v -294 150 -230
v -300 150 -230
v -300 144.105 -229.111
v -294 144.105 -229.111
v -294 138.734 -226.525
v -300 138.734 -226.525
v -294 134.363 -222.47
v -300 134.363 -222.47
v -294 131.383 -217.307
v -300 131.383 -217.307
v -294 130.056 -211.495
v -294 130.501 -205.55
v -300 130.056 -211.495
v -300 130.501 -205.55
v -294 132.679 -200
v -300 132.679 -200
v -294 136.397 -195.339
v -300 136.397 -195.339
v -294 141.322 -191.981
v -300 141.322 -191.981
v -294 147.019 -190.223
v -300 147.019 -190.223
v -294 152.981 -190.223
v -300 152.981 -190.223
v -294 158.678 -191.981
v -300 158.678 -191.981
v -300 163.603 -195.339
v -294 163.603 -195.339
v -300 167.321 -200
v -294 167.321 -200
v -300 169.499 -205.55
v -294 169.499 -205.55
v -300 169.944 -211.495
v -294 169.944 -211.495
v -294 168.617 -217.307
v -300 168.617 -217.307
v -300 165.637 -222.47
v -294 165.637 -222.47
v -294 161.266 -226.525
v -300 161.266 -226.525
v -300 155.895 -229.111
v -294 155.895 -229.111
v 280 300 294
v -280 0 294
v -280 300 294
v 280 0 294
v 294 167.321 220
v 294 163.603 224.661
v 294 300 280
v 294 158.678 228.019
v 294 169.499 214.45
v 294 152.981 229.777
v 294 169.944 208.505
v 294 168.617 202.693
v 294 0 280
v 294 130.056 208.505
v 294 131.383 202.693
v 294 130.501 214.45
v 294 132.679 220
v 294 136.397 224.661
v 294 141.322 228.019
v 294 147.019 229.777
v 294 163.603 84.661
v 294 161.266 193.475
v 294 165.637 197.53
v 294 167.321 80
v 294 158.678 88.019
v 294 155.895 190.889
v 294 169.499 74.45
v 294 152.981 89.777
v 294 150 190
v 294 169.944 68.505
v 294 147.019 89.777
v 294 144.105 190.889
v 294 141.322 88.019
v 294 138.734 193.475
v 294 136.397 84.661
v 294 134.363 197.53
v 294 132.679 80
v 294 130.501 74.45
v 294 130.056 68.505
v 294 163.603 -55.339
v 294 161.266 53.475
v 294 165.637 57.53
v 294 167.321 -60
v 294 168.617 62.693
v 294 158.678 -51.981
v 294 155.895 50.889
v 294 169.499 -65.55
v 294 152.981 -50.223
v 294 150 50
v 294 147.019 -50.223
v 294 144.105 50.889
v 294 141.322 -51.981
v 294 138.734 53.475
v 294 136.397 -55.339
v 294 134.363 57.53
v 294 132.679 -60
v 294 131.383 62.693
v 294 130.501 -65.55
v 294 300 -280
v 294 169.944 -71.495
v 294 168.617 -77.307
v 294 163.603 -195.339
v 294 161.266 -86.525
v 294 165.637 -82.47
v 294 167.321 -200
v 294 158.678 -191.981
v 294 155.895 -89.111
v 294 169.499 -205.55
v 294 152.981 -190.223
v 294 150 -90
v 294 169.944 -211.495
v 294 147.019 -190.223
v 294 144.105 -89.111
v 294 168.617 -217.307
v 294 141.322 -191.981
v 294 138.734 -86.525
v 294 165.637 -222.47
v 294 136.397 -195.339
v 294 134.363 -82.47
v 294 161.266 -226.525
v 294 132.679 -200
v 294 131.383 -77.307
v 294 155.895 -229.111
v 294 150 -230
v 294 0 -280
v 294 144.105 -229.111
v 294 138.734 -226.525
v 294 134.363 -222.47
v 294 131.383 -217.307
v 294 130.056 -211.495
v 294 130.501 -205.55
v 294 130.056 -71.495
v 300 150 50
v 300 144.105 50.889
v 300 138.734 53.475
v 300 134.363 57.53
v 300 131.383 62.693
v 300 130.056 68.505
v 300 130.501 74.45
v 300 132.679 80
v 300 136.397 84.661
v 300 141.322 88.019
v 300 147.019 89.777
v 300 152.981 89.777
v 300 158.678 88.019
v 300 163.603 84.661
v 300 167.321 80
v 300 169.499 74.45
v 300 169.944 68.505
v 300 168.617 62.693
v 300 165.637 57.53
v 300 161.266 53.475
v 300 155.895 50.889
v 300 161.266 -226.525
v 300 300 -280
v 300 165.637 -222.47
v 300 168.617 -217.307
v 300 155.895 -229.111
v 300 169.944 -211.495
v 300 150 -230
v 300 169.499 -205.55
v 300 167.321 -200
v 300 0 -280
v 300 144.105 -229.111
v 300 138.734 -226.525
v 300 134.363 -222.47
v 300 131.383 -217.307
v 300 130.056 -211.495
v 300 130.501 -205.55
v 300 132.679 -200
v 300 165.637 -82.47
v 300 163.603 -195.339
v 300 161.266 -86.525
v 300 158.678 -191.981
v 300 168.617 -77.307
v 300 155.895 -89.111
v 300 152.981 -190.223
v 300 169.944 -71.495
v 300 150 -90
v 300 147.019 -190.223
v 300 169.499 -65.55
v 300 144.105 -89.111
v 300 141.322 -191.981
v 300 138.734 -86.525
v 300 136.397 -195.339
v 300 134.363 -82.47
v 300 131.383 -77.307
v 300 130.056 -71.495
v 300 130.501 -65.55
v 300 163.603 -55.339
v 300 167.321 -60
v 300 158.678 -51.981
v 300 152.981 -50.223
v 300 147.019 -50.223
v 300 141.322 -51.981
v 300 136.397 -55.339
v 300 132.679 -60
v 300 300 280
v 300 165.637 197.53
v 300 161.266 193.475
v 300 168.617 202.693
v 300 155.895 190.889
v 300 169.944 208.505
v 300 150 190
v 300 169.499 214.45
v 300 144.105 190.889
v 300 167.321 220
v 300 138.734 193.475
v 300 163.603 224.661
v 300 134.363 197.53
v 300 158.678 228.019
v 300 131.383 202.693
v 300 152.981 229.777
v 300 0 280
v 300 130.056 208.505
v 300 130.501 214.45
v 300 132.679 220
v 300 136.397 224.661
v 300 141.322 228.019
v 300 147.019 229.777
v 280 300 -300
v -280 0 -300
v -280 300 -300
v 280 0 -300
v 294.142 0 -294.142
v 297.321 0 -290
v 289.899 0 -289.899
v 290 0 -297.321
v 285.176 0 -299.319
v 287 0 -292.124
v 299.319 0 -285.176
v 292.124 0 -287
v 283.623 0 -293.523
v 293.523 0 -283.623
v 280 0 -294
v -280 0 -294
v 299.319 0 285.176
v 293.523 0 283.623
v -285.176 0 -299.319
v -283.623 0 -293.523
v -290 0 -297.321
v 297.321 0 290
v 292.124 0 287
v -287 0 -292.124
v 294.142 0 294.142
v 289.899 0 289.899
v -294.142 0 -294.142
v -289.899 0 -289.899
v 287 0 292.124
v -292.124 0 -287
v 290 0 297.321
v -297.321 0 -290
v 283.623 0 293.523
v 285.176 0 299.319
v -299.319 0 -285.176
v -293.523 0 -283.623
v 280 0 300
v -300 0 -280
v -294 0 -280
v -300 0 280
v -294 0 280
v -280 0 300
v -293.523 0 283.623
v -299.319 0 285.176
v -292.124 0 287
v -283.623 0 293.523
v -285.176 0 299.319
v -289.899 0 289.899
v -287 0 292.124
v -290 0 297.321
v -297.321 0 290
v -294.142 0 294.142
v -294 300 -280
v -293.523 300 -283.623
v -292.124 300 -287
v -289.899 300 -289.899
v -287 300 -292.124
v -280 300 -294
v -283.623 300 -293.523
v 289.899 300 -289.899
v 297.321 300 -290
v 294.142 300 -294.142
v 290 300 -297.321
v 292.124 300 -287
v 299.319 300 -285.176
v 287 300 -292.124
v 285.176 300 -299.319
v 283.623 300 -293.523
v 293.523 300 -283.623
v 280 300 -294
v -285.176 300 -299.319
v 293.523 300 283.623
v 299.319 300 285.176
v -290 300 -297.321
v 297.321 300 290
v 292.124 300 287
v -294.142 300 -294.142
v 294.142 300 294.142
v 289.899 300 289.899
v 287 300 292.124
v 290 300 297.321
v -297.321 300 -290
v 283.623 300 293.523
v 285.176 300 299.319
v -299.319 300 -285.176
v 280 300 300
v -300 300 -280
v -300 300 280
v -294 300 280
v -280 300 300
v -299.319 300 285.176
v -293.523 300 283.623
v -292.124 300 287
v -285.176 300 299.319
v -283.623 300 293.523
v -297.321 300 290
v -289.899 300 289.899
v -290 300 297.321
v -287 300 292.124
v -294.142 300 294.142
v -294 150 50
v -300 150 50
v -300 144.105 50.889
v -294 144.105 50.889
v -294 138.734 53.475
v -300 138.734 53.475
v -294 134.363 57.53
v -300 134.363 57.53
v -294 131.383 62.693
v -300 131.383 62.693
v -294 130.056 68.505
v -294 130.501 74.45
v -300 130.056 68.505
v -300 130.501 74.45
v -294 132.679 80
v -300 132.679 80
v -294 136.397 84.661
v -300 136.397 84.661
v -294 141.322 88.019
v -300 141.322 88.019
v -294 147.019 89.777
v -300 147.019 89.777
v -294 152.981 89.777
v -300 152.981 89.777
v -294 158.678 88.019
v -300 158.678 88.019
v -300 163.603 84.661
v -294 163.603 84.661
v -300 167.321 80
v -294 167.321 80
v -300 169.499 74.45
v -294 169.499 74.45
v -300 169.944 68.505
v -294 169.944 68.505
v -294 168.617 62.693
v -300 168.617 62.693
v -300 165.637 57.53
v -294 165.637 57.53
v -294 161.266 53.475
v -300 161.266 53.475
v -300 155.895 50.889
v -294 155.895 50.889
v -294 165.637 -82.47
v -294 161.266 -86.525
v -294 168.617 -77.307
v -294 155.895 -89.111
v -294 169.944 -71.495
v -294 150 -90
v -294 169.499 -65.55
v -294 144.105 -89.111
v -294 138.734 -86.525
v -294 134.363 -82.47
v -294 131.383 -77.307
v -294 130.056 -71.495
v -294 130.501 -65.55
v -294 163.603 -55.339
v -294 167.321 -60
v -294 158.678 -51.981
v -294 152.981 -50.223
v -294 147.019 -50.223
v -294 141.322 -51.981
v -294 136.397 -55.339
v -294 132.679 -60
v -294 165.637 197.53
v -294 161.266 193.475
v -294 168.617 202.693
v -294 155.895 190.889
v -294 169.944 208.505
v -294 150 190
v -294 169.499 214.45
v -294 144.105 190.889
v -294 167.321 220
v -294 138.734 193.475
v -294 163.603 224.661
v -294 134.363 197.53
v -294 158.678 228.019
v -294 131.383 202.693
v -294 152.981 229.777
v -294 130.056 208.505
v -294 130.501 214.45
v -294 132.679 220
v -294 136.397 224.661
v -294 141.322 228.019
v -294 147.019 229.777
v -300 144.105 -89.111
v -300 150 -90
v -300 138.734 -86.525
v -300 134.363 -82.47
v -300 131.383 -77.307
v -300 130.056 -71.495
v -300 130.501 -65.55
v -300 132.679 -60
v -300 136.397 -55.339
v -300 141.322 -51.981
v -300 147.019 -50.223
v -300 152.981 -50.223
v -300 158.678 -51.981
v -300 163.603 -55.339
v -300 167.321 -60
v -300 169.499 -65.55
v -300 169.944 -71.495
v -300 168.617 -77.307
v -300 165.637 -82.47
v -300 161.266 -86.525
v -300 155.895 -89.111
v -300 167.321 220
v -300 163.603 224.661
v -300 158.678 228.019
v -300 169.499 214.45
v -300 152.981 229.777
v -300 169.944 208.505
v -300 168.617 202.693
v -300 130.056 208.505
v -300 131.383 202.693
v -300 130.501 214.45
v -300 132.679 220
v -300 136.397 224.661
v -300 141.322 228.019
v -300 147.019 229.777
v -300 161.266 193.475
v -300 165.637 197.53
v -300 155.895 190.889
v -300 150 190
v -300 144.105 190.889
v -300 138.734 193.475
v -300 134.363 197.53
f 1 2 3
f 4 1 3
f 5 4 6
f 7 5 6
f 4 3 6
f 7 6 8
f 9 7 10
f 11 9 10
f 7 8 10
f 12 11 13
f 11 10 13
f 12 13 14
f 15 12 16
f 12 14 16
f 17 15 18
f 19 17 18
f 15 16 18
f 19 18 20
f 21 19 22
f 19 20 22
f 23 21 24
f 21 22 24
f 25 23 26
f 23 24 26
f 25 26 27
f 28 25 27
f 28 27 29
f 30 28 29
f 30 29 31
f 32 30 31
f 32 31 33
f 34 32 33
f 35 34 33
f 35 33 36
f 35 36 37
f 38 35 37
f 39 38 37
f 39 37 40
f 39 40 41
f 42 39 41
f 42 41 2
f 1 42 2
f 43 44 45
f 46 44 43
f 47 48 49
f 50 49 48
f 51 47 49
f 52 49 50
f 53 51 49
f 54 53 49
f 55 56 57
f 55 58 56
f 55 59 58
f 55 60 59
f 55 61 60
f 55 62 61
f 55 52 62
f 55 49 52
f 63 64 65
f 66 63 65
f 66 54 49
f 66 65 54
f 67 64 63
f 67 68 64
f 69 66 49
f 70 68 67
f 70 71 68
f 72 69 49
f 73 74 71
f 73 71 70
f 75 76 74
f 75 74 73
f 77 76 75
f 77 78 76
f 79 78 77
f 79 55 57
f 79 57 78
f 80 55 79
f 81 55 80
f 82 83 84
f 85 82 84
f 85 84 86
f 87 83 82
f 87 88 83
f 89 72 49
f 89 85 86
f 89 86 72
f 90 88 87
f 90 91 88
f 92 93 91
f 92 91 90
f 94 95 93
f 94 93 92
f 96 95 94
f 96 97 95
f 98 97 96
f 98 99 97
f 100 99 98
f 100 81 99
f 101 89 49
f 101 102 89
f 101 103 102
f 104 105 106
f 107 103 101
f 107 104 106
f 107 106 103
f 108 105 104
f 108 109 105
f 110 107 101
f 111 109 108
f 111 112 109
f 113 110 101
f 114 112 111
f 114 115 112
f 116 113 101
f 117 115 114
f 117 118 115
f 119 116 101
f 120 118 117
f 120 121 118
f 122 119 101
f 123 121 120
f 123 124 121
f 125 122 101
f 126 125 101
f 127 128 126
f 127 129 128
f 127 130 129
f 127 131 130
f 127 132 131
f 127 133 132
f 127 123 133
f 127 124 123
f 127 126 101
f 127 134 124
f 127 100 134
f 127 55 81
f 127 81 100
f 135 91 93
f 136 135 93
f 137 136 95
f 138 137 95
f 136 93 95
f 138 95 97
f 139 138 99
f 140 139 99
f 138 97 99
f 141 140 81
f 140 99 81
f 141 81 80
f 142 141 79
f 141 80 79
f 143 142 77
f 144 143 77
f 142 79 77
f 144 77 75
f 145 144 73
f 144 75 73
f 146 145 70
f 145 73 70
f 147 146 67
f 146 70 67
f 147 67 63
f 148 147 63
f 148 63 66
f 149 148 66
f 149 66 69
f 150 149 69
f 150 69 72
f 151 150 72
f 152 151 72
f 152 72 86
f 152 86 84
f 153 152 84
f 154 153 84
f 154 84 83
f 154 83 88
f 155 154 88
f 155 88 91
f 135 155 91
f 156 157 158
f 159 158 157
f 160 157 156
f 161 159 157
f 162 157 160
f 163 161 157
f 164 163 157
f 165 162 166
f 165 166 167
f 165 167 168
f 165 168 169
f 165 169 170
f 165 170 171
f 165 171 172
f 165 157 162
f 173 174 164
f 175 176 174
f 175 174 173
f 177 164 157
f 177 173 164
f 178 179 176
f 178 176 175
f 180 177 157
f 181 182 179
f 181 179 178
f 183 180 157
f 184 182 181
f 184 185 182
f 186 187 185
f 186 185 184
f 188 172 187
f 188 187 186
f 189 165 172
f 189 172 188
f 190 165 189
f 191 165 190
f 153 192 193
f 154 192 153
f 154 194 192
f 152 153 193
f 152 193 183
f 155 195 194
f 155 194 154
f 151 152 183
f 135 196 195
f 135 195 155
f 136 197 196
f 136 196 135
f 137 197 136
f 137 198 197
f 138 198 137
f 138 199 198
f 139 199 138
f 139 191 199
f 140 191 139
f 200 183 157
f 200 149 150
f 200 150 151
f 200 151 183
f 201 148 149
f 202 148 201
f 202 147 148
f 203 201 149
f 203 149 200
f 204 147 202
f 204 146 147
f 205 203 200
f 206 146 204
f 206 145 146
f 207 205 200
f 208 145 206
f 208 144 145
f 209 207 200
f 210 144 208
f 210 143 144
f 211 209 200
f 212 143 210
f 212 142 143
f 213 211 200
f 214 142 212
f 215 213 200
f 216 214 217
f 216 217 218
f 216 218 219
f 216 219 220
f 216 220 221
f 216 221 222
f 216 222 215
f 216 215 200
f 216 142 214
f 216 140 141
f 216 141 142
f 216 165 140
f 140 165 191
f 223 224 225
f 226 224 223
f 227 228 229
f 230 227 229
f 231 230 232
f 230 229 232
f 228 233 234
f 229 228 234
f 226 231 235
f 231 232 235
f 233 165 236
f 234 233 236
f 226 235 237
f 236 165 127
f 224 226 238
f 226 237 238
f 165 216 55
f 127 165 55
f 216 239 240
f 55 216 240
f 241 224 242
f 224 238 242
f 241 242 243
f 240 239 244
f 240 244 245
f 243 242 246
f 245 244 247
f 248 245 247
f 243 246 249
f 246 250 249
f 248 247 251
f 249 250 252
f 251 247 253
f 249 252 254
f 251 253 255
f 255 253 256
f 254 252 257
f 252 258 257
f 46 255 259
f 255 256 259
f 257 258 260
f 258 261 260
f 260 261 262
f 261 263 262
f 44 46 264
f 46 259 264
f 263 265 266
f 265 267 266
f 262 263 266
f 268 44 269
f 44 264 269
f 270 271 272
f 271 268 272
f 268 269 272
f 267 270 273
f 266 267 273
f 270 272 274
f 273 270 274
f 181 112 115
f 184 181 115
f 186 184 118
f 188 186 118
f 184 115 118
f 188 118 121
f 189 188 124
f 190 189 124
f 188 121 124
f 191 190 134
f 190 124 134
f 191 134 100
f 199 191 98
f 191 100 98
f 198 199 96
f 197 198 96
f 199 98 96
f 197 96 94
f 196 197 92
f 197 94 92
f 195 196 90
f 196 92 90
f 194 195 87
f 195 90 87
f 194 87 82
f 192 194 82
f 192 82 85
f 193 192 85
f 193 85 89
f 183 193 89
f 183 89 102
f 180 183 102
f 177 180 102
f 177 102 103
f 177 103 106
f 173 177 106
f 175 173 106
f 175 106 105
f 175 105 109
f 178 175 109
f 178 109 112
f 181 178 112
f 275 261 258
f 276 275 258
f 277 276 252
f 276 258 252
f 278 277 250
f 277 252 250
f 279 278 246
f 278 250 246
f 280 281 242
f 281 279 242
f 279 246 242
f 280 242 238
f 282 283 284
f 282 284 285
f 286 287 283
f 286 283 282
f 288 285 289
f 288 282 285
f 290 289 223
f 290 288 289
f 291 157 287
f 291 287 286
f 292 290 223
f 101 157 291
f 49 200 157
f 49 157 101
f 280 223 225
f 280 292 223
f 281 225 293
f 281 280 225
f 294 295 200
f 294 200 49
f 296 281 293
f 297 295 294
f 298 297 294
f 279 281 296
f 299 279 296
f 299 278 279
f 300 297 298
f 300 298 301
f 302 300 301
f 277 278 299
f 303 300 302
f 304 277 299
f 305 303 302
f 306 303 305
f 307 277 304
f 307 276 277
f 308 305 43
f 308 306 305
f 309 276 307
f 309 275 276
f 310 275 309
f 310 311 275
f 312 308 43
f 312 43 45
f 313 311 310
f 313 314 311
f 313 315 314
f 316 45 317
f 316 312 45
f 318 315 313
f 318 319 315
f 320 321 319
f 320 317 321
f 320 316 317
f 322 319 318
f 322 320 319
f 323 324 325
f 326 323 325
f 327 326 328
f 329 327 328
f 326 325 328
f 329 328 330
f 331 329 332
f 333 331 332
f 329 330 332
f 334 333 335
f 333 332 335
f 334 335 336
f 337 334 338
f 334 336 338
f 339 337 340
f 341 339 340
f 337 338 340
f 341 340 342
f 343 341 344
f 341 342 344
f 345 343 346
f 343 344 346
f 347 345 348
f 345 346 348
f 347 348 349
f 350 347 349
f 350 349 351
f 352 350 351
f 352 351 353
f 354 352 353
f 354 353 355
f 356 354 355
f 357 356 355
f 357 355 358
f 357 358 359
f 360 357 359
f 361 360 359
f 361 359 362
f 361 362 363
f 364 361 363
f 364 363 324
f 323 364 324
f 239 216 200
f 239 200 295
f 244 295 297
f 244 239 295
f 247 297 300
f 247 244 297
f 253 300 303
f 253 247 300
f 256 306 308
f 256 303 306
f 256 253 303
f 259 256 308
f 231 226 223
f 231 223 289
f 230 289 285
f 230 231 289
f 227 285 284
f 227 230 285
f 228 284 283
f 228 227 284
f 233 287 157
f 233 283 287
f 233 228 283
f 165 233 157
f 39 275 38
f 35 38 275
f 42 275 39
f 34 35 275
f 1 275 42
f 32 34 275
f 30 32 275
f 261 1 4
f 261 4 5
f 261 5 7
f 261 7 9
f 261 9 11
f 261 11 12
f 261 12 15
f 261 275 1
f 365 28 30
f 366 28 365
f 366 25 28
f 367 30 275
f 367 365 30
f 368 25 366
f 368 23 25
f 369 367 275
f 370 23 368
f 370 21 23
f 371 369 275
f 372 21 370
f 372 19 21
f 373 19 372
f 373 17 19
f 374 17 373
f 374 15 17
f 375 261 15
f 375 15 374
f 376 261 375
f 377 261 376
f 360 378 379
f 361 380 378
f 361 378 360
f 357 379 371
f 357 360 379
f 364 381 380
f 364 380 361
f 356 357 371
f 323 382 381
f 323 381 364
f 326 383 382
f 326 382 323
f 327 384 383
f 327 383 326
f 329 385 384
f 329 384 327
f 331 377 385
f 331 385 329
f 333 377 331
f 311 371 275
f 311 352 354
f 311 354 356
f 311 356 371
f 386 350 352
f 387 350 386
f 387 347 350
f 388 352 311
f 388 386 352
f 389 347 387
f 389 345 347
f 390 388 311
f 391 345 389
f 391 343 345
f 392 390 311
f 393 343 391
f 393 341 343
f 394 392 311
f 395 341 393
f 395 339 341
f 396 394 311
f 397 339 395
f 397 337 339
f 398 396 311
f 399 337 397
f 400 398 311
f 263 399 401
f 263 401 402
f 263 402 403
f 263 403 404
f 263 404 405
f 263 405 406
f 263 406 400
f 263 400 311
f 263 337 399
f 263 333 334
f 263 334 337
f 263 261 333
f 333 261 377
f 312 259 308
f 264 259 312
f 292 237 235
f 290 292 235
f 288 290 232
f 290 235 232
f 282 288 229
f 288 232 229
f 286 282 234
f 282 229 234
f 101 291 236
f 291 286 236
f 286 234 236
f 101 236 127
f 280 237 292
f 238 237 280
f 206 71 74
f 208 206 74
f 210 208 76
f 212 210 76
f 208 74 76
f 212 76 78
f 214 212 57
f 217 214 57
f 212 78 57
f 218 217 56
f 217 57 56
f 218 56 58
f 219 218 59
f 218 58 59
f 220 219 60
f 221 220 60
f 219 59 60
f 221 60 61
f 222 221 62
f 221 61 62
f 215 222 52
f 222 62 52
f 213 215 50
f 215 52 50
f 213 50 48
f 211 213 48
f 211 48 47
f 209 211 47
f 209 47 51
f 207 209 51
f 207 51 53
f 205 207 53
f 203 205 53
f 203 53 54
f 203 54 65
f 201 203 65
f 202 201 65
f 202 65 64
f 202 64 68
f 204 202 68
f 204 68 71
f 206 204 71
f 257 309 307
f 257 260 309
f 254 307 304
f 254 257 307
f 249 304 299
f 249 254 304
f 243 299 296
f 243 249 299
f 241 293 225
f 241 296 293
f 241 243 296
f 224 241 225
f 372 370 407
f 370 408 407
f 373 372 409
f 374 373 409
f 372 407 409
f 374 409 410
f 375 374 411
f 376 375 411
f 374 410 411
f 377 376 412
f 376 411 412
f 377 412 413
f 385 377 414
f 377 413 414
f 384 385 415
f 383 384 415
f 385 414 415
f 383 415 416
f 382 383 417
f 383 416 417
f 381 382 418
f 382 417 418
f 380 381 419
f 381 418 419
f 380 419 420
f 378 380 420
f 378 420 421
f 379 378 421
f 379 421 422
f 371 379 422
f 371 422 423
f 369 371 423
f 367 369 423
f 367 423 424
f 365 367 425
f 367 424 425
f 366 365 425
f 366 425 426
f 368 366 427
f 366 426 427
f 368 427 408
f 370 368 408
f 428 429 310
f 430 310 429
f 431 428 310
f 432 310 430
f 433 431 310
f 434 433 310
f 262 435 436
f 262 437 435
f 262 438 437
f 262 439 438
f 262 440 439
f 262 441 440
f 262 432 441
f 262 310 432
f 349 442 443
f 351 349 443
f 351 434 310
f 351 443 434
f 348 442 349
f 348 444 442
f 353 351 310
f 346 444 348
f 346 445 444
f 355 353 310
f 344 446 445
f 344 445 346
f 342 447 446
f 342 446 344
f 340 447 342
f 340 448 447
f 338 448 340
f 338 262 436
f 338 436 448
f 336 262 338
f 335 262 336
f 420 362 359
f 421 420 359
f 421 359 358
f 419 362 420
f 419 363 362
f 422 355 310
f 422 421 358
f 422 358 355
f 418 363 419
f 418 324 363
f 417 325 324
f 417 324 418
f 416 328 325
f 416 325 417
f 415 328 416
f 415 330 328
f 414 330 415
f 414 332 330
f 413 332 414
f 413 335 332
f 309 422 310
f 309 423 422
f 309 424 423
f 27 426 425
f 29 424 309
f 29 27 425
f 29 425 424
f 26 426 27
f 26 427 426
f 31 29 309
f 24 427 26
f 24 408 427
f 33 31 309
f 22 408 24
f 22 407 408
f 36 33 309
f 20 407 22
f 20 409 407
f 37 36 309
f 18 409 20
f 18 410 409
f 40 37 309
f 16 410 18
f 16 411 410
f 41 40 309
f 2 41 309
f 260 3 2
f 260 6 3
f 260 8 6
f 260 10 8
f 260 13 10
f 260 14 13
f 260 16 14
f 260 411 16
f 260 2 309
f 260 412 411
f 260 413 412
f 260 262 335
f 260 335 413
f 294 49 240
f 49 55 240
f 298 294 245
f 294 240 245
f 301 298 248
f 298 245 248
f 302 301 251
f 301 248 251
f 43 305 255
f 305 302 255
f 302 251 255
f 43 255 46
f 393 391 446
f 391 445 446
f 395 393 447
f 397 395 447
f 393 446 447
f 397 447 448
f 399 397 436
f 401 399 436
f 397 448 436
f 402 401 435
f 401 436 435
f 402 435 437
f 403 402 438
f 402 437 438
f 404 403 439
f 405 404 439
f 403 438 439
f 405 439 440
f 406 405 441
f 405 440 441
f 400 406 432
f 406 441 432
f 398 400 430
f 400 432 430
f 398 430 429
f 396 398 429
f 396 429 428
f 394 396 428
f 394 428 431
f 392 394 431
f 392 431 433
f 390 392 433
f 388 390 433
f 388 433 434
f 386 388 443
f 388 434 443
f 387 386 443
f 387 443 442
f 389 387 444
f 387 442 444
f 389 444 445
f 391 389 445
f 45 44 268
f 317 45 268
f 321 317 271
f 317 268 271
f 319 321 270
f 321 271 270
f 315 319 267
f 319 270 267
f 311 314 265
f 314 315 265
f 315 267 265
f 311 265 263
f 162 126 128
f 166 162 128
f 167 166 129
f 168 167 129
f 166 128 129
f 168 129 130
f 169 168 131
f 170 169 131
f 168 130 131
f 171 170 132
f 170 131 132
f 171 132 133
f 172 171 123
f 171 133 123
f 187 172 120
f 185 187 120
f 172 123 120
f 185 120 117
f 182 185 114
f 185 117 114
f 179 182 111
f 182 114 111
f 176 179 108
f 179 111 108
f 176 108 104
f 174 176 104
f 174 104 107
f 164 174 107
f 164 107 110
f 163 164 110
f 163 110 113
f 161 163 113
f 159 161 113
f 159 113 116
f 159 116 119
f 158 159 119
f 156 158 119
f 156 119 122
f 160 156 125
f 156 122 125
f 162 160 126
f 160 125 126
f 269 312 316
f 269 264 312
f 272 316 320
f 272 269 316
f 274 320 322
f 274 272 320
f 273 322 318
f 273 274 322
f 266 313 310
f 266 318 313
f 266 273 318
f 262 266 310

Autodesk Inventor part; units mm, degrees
ref_plane "YZ Plane" through (0, 0, 0) normal (1, 0, 0) x (0, 1, 0)
ref_plane "XZ Plane" through (0, 0, 0) normal (0, 1, 0) x (-1, 0, 0)
ref_plane "XY Plane" through (0, 0, 0) normal (0, 0, 1) x (1, 0, 0)
sketch "Sketch1" plane through (0, 0, 0) normal (0, 1, 0) x (-1, 0, 0)
  line L0 (-280, 300) -> (280, 300)
  line L1 (300, 280) -> (300, -280)
  line L2 (280, -300) -> (-280, -300)
  line L3 (-300, -280) -> (-300, 280)
  line L4 (-300, 300) -> (300, -300) construction
  line L5 (300, 300) -> (-300, -300) construction
  arc A0 (300, 280) -> (280, 300) centre (280, 280) ccw
  arc A1 (280, -300) -> (300, -280) centre (280, -280) ccw
  arc A2 (-300, -280) -> (-280, -300) centre (-280, -280) ccw
  arc A3 (-280, 300) -> (-300, 280) centre (-280, 280) ccw
  line L6 (280, 294) -> (-280, 294)
  arc A4 (-280, 294) -> (-294, 280) centre (-280, 280) ccw
  line L7 (-294, 280) -> (-294, -280)
  arc A5 (-294, -280) -> (-280, -294) centre (-280, -280) ccw
  line L8 (-280, -294) -> (280, -294)
  arc A6 (280, -294) -> (294, -280) centre (280, -280) ccw
  line L9 (294, -280) -> (294, 280)
  arc A7 (294, 280) -> (280, 294) centre (280, 280) ccw
  point P0 (0, 0)
  dimension "d0" = 600
  dimension "d1" = 600
  dimension "d2" = 20
  dimension "d3" = 6
extrude "Extrusion1" add sketch "Sketch1" along normal blind 300
sketch "Sketch2" plane through (300, 0, 280) normal (1, 0, 0) x (0, 0, -1)
  line L0 (0, 0) -> (0, 300) projected
  line L1 (0, 150) -> (560, 150) construction
  line L2 (560, 0) -> (560, 300) projected
  point P0 (280, 0)
  point P1 (70, 150)
  point P2 (210, 150)
  point P3 (350, 150)
  point P4 (490, 150)
  dimension "d6" = 70
  dimension "d7" = 140
  dimension "d8" = 140
  dimension "d9" = 140
hole "Hole1" at (300, 150, 210) at (300, 150, 70) at (300, 150, -70) at (300, 150, -210) direction (-1, 0, 0) diameter 40 end through all
properties part number "Stackbox"
